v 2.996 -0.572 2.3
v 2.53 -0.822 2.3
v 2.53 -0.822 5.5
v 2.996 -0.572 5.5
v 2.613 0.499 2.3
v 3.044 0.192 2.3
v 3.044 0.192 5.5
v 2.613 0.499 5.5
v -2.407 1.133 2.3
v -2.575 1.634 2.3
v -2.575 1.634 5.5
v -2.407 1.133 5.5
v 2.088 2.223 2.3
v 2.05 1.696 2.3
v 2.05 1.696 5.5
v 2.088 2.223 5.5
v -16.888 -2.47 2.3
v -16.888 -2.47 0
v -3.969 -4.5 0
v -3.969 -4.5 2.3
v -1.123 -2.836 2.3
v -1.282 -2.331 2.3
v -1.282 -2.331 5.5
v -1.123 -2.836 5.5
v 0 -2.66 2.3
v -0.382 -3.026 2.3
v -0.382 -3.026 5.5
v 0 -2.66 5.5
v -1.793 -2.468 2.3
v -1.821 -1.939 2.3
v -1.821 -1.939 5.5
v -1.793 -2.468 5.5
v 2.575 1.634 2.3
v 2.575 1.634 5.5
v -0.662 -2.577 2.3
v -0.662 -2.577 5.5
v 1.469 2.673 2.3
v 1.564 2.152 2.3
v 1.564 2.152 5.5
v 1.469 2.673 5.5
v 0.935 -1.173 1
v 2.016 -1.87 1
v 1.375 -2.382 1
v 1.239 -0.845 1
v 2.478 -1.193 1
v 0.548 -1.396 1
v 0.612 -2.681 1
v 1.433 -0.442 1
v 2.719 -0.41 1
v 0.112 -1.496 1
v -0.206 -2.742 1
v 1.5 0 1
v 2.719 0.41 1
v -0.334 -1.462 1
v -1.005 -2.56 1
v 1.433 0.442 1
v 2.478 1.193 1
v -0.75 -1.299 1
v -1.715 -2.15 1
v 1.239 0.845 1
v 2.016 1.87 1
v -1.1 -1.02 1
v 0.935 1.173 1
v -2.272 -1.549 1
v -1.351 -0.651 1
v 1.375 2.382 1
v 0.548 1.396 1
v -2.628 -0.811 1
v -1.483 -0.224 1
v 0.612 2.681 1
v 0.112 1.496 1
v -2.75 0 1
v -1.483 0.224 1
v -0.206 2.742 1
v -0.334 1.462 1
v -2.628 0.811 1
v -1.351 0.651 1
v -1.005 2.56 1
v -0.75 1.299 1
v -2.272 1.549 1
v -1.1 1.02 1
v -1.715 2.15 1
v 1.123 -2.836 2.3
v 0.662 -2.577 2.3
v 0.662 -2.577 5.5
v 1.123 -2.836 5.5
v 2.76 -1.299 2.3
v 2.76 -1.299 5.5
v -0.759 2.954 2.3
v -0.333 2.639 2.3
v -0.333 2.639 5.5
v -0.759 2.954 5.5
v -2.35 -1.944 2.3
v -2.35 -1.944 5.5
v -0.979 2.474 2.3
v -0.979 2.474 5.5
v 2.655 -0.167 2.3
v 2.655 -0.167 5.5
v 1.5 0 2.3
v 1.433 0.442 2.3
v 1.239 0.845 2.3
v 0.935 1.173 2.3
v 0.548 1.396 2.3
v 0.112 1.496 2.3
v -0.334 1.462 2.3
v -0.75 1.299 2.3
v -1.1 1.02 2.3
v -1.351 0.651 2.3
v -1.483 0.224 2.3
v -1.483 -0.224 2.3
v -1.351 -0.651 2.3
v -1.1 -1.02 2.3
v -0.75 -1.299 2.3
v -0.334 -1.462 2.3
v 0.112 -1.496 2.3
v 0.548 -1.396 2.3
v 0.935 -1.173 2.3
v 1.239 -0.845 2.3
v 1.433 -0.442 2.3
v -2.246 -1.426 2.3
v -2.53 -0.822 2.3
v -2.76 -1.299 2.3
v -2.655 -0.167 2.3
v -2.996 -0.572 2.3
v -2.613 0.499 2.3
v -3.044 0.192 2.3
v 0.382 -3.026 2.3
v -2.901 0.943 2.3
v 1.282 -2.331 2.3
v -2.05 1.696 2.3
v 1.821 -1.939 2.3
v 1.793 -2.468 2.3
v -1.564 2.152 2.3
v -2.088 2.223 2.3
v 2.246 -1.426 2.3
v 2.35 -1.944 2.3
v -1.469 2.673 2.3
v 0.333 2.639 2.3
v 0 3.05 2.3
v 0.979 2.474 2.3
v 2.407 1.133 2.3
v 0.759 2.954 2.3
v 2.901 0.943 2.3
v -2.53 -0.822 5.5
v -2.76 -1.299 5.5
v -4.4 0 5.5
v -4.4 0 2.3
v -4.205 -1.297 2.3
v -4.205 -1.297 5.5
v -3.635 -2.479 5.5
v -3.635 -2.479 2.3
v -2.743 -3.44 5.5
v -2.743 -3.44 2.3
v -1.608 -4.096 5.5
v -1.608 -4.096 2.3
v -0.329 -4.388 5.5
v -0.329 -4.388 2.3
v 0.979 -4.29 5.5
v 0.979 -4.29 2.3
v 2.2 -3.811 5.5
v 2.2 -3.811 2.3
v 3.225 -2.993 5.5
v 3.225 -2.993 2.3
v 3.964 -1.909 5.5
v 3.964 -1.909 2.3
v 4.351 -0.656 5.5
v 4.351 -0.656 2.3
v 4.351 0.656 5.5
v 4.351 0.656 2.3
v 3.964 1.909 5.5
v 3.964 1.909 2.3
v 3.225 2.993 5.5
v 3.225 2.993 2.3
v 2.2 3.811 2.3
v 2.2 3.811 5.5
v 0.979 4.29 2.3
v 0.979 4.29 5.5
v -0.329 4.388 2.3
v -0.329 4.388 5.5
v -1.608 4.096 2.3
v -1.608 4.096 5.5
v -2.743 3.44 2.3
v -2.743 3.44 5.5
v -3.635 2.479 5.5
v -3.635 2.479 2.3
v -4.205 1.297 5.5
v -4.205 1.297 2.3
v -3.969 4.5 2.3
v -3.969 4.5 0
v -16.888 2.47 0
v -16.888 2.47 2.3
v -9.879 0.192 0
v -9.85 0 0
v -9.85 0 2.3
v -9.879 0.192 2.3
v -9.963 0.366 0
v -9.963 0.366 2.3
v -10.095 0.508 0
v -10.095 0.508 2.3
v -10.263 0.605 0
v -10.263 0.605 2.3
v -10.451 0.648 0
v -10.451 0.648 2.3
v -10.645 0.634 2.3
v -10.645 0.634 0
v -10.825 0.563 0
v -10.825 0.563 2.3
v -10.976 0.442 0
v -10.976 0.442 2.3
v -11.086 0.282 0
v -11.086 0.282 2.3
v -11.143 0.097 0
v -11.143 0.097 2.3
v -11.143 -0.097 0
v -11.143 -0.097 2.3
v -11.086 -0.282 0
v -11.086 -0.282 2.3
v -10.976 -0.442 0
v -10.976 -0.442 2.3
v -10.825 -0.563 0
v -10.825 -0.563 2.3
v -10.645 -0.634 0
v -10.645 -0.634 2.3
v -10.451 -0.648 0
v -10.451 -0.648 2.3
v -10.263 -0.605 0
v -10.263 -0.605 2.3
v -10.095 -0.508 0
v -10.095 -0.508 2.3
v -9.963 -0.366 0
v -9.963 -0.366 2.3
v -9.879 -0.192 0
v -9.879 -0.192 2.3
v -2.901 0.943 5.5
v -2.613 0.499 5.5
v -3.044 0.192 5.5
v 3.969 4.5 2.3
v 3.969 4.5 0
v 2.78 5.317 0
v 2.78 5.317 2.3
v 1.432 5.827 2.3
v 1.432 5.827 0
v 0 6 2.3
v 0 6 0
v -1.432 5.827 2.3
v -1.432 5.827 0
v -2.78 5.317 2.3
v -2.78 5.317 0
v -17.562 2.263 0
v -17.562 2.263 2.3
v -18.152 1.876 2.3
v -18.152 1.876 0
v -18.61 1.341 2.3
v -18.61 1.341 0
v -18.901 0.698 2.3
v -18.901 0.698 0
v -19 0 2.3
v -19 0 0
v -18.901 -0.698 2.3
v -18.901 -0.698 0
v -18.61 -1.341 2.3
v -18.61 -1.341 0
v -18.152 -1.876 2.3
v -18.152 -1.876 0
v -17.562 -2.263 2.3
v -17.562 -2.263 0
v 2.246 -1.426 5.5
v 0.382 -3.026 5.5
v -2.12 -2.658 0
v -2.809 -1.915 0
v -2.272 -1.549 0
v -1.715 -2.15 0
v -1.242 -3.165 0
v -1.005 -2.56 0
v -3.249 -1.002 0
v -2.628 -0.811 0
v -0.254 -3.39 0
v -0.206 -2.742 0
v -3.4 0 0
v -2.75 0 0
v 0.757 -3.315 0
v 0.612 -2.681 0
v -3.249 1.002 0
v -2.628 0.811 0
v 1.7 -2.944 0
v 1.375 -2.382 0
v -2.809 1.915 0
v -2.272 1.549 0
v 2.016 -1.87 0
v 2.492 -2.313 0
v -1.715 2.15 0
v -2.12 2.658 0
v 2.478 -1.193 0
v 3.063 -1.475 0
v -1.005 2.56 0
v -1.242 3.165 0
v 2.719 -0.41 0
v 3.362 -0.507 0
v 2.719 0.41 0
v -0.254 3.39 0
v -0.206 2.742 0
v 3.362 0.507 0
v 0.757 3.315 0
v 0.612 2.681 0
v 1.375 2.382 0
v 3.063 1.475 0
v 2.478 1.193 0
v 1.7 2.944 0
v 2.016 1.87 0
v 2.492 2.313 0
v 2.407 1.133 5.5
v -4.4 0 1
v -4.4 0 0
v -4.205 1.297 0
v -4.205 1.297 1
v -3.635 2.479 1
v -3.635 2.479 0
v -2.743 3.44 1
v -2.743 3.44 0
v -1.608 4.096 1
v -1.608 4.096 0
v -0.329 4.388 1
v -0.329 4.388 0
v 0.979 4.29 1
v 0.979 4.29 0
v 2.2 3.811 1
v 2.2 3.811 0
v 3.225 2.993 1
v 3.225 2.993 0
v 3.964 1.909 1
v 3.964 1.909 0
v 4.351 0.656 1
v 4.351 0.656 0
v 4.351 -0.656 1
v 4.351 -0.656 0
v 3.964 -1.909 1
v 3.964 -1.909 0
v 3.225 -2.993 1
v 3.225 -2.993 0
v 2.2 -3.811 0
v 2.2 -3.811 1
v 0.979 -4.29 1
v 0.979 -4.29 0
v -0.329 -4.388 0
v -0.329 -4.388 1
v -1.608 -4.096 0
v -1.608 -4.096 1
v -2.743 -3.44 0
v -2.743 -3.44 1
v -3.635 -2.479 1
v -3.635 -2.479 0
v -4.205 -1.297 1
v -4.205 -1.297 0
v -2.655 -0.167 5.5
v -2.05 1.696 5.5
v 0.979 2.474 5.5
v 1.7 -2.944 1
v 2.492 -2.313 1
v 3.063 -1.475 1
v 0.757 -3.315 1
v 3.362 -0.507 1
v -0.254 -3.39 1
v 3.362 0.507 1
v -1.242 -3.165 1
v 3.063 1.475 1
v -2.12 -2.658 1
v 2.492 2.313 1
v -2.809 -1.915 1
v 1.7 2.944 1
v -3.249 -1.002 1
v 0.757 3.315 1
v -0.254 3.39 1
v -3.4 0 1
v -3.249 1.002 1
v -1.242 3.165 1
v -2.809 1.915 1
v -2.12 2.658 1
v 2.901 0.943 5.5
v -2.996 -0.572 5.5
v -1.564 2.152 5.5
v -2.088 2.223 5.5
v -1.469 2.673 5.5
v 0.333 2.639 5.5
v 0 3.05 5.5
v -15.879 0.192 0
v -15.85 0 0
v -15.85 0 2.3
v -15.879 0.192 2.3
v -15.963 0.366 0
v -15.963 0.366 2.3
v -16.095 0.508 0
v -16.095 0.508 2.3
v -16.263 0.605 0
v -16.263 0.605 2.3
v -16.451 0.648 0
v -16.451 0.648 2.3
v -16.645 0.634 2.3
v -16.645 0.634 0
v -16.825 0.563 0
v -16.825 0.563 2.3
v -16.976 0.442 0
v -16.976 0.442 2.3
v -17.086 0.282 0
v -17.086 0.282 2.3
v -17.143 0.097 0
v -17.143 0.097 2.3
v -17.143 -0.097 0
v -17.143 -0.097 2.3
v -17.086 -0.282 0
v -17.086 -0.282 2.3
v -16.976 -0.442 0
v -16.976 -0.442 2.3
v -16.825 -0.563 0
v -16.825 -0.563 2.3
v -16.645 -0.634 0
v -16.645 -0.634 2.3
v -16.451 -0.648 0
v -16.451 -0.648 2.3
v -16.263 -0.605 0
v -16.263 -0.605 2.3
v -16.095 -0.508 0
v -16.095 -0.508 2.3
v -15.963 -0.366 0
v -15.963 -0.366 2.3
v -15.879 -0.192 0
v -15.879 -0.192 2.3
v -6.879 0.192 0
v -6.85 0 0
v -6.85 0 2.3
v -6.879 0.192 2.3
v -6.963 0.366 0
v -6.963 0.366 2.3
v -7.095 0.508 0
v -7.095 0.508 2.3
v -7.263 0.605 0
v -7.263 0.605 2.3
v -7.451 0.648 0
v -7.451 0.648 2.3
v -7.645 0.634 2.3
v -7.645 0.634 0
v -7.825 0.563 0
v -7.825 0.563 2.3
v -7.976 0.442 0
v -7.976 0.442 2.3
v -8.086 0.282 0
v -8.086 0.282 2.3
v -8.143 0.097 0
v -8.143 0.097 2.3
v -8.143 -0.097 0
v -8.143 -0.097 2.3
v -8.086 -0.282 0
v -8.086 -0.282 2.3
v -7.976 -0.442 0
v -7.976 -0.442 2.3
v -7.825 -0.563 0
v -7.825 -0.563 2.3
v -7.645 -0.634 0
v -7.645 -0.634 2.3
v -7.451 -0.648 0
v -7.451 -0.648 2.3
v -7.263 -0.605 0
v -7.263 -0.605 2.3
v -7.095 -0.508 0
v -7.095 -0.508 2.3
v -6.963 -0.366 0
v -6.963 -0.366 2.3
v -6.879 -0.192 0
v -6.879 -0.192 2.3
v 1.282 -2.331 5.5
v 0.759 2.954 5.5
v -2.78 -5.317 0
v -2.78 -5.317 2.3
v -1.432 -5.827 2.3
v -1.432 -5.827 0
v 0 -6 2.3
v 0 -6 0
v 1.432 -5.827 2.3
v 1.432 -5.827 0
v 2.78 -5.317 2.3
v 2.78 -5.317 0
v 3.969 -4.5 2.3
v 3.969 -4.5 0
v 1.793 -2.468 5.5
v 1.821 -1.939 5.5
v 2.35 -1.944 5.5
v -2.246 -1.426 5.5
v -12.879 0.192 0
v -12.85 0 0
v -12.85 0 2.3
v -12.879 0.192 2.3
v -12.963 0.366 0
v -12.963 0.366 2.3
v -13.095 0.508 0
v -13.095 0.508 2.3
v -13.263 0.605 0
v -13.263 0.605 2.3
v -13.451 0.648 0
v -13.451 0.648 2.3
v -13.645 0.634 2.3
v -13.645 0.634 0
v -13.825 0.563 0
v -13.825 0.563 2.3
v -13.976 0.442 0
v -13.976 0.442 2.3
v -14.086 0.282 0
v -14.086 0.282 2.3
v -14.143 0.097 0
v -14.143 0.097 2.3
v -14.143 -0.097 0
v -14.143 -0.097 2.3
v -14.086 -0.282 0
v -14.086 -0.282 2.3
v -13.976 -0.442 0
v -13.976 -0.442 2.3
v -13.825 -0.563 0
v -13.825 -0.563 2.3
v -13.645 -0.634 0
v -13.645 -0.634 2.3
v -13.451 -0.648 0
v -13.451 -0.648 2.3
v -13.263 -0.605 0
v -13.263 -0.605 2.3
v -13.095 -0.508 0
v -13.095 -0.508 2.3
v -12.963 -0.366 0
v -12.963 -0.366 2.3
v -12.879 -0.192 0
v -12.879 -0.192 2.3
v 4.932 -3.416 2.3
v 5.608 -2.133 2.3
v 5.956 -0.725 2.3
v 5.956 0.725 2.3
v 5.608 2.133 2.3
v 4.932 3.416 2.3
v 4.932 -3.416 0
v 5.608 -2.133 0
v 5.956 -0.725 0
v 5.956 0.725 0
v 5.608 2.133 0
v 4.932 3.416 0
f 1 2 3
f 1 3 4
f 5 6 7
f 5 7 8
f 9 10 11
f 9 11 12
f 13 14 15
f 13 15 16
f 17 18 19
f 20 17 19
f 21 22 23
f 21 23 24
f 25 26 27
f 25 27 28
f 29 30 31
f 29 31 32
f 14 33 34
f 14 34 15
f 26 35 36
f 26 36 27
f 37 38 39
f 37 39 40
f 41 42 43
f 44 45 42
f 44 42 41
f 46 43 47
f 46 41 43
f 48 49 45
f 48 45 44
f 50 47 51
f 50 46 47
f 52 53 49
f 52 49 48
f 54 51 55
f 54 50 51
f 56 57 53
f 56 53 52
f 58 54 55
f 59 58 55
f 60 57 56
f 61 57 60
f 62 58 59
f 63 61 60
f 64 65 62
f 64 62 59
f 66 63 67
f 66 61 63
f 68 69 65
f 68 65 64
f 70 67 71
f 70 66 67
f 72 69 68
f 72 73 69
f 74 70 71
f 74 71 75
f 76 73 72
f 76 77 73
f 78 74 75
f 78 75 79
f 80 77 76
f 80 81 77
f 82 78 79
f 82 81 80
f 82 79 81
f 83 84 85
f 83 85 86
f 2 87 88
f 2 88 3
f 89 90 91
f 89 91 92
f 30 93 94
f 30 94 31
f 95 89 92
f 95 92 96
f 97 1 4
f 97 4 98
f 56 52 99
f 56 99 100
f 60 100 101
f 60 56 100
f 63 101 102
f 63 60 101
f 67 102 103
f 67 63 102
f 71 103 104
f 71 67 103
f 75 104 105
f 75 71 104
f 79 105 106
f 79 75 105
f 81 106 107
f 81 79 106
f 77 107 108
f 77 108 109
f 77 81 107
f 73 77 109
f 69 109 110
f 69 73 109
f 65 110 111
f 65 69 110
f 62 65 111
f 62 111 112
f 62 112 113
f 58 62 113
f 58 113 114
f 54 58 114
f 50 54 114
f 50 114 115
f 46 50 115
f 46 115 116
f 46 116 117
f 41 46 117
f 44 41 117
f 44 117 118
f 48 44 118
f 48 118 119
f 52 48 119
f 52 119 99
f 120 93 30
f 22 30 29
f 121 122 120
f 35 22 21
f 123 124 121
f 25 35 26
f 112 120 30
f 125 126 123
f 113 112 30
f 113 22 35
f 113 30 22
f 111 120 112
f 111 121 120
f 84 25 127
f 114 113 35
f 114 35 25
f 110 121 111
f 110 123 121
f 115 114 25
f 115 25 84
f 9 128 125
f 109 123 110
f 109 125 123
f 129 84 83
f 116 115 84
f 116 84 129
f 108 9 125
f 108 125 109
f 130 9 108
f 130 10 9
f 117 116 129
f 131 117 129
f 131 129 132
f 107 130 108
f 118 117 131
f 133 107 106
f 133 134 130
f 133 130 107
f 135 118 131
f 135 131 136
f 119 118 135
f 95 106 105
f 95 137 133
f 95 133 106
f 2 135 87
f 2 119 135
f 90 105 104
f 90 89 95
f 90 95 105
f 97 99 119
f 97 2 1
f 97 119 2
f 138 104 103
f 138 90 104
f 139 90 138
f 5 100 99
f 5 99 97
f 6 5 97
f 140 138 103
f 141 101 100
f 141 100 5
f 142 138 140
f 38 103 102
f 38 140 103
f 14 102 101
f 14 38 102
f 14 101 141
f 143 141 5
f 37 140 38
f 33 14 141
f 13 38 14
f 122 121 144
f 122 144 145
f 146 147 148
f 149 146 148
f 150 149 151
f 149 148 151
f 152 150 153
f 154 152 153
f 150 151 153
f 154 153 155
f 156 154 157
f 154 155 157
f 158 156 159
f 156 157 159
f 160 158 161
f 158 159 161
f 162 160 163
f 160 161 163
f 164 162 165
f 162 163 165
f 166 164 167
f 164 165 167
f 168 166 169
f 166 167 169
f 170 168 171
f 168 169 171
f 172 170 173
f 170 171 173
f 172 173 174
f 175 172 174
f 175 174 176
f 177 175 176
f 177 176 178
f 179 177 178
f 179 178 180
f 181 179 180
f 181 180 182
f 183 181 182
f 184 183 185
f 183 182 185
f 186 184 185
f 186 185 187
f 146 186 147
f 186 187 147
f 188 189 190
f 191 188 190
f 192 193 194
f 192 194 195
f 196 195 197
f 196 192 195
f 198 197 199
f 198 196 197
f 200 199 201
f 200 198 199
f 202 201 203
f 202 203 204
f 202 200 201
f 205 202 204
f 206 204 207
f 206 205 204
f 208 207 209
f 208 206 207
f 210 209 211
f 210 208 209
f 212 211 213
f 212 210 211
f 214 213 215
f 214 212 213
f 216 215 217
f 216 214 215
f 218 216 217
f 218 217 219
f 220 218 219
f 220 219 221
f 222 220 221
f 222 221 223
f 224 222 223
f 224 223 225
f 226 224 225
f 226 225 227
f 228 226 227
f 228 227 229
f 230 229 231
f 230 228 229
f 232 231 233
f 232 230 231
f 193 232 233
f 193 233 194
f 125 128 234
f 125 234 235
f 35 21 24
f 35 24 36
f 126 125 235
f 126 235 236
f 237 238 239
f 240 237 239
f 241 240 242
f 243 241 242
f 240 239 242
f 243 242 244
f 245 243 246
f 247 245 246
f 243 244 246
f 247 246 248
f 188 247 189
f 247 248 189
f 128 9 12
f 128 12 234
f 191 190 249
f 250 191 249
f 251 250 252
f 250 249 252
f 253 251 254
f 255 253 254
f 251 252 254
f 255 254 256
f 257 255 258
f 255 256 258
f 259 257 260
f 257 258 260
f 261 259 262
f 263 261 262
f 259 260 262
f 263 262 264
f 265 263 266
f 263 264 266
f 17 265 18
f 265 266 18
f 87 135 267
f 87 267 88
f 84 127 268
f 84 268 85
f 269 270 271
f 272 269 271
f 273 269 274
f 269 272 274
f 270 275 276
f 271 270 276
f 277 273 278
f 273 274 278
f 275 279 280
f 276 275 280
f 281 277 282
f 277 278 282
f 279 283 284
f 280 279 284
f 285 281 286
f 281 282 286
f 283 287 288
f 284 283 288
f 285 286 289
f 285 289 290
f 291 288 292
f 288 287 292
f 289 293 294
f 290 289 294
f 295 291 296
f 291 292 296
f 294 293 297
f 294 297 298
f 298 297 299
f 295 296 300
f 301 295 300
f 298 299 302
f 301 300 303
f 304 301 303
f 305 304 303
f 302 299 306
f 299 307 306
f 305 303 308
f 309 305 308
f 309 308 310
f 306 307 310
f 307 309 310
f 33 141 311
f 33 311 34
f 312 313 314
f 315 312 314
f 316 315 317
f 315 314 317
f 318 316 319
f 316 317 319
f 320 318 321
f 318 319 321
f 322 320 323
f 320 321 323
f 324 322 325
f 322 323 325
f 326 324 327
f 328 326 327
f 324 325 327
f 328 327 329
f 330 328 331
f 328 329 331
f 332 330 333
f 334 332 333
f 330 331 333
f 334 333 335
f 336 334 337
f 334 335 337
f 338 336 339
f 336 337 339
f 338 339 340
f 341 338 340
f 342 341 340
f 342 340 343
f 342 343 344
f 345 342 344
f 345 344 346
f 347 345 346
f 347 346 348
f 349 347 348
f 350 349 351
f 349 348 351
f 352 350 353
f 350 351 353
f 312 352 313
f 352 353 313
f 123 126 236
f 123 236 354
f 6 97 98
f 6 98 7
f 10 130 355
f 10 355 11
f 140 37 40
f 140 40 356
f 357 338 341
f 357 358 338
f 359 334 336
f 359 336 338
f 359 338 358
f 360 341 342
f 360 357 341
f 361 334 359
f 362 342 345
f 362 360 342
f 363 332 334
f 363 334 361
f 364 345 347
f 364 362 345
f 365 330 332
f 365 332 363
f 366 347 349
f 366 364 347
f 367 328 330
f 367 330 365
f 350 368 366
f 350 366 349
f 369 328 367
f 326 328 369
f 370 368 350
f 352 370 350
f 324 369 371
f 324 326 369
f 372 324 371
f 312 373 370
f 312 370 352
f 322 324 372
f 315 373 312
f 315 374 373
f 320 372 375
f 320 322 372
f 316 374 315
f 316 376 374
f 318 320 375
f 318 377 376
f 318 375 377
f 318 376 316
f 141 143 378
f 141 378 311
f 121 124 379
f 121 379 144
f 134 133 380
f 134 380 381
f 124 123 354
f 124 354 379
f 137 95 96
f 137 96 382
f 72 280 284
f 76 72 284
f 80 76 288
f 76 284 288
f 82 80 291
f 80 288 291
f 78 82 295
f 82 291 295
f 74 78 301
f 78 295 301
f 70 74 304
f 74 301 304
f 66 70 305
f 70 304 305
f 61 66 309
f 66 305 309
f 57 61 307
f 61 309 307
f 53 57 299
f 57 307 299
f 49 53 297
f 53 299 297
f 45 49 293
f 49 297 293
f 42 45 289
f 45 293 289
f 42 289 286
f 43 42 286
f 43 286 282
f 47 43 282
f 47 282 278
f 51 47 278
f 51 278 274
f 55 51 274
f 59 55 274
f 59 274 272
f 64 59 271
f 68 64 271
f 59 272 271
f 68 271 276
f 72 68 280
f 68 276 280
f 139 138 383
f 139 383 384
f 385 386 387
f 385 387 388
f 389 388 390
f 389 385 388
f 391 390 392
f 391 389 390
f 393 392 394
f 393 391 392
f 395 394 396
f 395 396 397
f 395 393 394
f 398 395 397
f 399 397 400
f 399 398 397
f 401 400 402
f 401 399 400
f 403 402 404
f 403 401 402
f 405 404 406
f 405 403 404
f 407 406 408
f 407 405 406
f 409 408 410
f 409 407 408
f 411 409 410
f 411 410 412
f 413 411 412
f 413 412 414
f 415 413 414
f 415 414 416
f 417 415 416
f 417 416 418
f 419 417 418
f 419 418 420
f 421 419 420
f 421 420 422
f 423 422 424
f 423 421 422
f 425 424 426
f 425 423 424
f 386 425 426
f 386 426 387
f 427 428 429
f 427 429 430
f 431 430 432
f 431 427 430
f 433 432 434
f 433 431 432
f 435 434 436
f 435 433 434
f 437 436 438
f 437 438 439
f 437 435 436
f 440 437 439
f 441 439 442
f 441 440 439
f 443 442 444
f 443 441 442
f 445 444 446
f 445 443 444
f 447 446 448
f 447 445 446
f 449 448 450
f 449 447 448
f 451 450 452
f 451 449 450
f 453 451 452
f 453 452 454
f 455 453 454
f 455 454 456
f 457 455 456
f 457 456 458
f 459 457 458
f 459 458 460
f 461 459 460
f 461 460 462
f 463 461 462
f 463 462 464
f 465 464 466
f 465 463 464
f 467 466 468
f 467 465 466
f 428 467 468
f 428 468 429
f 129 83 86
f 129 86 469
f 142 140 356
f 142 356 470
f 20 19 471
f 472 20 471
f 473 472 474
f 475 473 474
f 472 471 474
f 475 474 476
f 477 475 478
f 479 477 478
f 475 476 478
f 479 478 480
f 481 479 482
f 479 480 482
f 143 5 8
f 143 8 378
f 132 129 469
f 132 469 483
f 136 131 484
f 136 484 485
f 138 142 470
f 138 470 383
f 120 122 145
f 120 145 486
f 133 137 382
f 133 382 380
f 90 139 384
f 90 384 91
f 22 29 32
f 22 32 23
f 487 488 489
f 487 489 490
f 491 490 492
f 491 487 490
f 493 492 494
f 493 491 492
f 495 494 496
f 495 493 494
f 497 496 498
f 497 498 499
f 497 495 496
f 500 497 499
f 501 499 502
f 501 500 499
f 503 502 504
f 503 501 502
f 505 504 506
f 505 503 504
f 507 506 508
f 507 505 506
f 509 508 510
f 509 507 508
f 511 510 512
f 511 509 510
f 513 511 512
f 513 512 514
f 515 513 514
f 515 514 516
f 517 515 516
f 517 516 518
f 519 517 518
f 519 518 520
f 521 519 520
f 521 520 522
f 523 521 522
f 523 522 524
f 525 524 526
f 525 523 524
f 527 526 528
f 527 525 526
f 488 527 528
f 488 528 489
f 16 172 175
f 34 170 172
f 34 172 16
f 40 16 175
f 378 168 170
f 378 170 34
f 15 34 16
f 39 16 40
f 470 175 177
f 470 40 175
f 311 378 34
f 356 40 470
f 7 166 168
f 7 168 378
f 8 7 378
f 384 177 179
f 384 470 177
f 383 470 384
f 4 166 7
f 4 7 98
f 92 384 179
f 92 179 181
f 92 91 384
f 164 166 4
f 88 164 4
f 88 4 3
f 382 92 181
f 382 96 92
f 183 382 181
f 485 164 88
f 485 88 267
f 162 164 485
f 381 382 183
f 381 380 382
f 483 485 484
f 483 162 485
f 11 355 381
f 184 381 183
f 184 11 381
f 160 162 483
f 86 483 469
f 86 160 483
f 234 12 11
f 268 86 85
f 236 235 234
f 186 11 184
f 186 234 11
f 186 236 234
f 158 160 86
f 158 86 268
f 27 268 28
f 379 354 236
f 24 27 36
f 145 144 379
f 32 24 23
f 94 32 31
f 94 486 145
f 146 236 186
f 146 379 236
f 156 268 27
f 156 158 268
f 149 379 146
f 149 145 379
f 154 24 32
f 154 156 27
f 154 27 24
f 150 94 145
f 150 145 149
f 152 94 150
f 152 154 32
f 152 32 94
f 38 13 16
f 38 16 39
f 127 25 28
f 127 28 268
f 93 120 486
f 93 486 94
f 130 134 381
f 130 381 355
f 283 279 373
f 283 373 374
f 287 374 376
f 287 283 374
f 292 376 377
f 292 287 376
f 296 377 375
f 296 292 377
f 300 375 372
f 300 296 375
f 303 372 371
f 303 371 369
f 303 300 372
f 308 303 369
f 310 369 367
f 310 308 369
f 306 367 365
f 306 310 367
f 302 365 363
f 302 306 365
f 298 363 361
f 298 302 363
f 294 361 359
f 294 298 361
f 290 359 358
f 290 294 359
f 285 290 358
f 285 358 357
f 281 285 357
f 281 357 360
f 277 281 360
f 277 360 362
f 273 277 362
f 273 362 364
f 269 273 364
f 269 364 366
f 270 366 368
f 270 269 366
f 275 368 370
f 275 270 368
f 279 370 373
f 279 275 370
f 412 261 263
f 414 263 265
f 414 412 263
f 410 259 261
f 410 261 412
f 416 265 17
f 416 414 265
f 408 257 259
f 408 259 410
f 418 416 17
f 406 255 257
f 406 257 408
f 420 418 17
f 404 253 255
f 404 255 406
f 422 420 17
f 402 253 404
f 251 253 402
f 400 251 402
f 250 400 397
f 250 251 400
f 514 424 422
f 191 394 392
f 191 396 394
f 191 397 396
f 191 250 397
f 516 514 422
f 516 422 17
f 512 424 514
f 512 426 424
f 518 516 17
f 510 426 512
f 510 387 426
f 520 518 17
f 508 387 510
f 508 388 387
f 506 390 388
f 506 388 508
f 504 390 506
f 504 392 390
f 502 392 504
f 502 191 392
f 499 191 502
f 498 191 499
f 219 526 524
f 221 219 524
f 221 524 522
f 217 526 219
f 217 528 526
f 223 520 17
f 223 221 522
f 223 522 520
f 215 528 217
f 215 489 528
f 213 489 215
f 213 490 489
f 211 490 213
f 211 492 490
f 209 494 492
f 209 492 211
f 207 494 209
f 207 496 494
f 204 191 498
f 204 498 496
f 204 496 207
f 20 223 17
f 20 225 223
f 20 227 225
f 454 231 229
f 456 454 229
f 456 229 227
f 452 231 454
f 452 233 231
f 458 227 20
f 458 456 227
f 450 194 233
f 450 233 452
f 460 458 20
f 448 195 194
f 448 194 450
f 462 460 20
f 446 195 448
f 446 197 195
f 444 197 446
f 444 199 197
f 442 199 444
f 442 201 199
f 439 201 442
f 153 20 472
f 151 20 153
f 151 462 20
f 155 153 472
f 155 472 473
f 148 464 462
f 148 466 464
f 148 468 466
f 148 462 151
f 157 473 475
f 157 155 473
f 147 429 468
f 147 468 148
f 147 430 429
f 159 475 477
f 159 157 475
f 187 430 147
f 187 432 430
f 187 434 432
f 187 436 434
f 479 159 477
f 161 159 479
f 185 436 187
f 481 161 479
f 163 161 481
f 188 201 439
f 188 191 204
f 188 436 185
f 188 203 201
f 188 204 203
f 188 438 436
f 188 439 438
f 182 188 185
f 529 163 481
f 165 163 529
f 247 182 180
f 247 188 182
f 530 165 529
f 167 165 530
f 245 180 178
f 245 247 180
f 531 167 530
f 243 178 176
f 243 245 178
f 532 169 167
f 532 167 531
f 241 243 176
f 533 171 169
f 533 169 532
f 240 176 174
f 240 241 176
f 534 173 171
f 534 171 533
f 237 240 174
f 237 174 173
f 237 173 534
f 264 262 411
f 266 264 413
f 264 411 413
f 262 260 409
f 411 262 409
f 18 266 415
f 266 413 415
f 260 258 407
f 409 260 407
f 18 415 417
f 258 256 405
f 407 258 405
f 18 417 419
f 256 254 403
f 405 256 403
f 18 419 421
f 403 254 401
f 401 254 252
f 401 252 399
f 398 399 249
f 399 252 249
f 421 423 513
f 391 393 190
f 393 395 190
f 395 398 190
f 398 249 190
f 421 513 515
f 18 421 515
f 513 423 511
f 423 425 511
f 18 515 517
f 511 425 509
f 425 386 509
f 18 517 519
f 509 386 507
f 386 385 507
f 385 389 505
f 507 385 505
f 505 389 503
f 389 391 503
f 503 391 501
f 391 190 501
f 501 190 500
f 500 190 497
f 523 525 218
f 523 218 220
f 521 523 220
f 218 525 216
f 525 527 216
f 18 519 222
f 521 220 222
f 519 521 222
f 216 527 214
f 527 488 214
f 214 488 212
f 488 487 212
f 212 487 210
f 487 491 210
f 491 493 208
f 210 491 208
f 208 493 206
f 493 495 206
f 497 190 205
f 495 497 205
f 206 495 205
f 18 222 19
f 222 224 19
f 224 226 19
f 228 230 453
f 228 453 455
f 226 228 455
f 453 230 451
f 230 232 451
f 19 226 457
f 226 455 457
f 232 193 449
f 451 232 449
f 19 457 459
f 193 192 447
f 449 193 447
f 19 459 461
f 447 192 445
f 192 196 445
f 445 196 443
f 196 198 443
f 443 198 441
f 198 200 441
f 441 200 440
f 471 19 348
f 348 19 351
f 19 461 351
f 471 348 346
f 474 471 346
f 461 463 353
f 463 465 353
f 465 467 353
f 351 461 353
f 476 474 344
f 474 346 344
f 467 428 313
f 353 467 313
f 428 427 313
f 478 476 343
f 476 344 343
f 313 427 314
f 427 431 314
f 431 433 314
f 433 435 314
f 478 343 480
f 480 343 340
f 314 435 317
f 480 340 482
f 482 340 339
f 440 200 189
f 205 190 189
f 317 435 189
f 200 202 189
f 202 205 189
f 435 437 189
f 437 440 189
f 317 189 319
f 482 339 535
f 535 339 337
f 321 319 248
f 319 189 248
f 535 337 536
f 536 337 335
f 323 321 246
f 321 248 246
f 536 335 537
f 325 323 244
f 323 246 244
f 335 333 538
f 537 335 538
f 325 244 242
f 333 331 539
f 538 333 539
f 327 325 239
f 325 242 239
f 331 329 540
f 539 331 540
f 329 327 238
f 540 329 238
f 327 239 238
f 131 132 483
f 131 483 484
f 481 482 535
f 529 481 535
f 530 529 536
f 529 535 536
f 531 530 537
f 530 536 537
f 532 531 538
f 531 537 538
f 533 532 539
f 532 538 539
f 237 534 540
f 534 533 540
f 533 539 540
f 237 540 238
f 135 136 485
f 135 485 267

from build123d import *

# Parameters (mm, degrees)
SKETCH_1_R          = 0.65
SKETCH_1_R_2        = 1.5
EXTRUDE_1_DEPTH     = 2.3
SKETCH_2_R          = 4.4
EXTRUDE_2_DEPTH     = 3.2
SKETCH_3_R          = 4.4
SKETCH_3_R_2        = 3.4
SKETCH_3_R_3        = 2.75
SKETCH_3_R_4        = 1.5
CUT_EXTRUDE_1_DEPTH = 1
CUT_EXTRUDE1_REACH  = 22.67


with BuildPart() as part:
    # Эскиз1 → Бобышка-Вытянуть1 (new body)
    with BuildSketch(Plane.XY):
        with BuildLine():
            Line((-3.968626967, 4.5), (-16.888114198, 2.469689731))
            ThreePointArc((-16.888114198, 2.469689731), (-19, 0), (-16.888114198, -2.469689731))
            Line((-16.888114198, -2.469689731), (-3.968626967, -4.5))
            ThreePointArc((-3.968626967, -4.5), (0, -6), (3.968626967, -4.5))
            Line((3.968626967, -4.5), (16.888114198, -2.469689731))
            ThreePointArc((16.888114198, -2.469689731), (19, 0), (16.888114198, 2.469689731))
            Line((16.888114198, 2.469689731), (3.968626967, 4.5))
            ThreePointArc((3.968626967, 4.5), (0, 6), (-3.968626967, 4.5))
        make_face()
        with Locations((-16.5, 0)):
            Circle(SKETCH_1_R, mode=Mode.SUBTRACT)
        with Locations((-13.5, 0)):
            Circle(SKETCH_1_R, mode=Mode.SUBTRACT)
        with Locations((-10.5, 0)):
            Circle(SKETCH_1_R, mode=Mode.SUBTRACT)
        with Locations((-7.5, 0)):
            Circle(SKETCH_1_R, mode=Mode.SUBTRACT)
        with Locations(Location((16.5, 0, 0), (0, 0, 180))):
            Circle(SKETCH_1_R, mode=Mode.SUBTRACT)
        with Locations(Location((7.5, 0, 0), (0, 0, 180))):
            Circle(SKETCH_1_R, mode=Mode.SUBTRACT)
        with Locations(Location((10.5, 0, 0), (0, 0, 180))):
            Circle(SKETCH_1_R, mode=Mode.SUBTRACT)
        with Locations(Location((13.5, 0, 0), (0, 0, 180))):
            Circle(SKETCH_1_R, mode=Mode.SUBTRACT)
        Circle(SKETCH_1_R_2, mode=Mode.SUBTRACT)
    extrude(amount=EXTRUDE_1_DEPTH)

    # Эскиз2 → Бобышка-Вытянуть2 (add)
    with BuildSketch(Plane.XY.offset(2.3)):
        with Locations(Location((0, 0, 0), (0, 0, 180))):
            Circle(SKETCH_2_R)
        Polygon((0.333439775, 2.639447604), (0, 3.05), (-0.333439775, 2.639447604), (-0.758504156, 2.954178641), (-0.979368078, 2.473601404), (-1.469348706, 2.672735374), (-1.563759083, 2.15232973), (-2.087868673, 2.223354314), (-2.049893354, 1.695819264), (-2.575200173, 1.634271725), (-2.407225286, 1.132754236), (-2.900722375, 0.942501833), (-2.6133024, 0.498514094), (-3.043981522, 0.191511085), (-2.655176114, -0.167049522), (-2.995976115, -0.571513009), (-2.530215347, -0.822116802), (-2.75972251, -1.298626839), (-2.246271844, -1.42552746), (-2.35006539, -1.944143169), (-1.821186821, -1.939366985), (-1.792745019, -2.467501833), (-1.281669931, -2.33134895), (-1.122779886, -2.835818282), (-0.661621006, -2.576843686), (-0.382266362, -3.025949839), (0, -2.660425857), (0.382266362, -3.025949839), (0.661621006, -2.576843686), (1.122779886, -2.835818282), (1.281669931, -2.33134895), (1.792745019, -2.467501833), (1.821186821, -1.939366985), (2.35006539, -1.944143169), (2.246271844, -1.42552746), (2.75972251, -1.298626839), (2.530215347, -0.822116802), (2.995976115, -0.571513009), (2.655176114, -0.167049522), (3.043981522, 0.191511085), (2.6133024, 0.498514094), (2.900722375, 0.942501833), (2.407225286, 1.132754236), (2.575200173, 1.634271725), (2.049893354, 1.695819264), (2.087868673, 2.223354314), (1.563759083, 2.15232973), (1.469348706, 2.672735374), (0.979368078, 2.473601404), (0.758504156, 2.954178641), align=None, mode=Mode.SUBTRACT)
    extrude(amount=EXTRUDE_2_DEPTH)

    # Эскиз3 → Вырез-Вытянуть1 (cut)
    # profile 1 of 2: a face of its own
    with BuildSketch(Plane(origin=(0, 0, 0), x_dir=(-1, 0, 0), z_dir=(0, 0, -1))):
        Circle(SKETCH_3_R)
        Circle(SKETCH_3_R_2, mode=Mode.SUBTRACT)
    # profile 2 of 2: a face of its own
    with BuildSketch(Plane(origin=(0, 0, 0), x_dir=(-1, 0, 0), z_dir=(0, 0, -1))):
        Circle(SKETCH_3_R_3)
        Circle(SKETCH_3_R_4, mode=Mode.SUBTRACT)
    extrude(amount=-CUT_EXTRUDE_1_DEPTH, mode=Mode.SUBTRACT)

    # Sketch1 → Cut-Extrude1 (cut, up to next)
    with BuildSketch(Plane(origin=(0, 0, 0), x_dir=(-1, 0, 0), z_dir=(0, 0, -1)), mode=Mode.PRIVATE) as cut_extrude1_sk1:
        with BuildLine():
            Line((-3.968626967, 4.5), (-16.888114198, 2.469689731))
            ThreePointArc((-16.888114198, 2.469689731), (-19, 0), (-16.888114198, -2.469689731))
            Line((-16.888114198, -2.469689731), (-3.968626967, -4.5))
            ThreePointArc((-3.968626967, -4.5), (-6, 0), (-3.968626967, 4.5))
        make_face()
    cut_extrude1_tool1 = extrude(cut_extrude1_sk1.sketch, amount=-CUT_EXTRUDE1_REACH, mode=Mode.PRIVATE) & part.part
    add(cut_extrude1_tool1.solids().sort_by_distance((11.282562, 0, 0))[0], mode=Mode.SUBTRACT)


solid = part.part
